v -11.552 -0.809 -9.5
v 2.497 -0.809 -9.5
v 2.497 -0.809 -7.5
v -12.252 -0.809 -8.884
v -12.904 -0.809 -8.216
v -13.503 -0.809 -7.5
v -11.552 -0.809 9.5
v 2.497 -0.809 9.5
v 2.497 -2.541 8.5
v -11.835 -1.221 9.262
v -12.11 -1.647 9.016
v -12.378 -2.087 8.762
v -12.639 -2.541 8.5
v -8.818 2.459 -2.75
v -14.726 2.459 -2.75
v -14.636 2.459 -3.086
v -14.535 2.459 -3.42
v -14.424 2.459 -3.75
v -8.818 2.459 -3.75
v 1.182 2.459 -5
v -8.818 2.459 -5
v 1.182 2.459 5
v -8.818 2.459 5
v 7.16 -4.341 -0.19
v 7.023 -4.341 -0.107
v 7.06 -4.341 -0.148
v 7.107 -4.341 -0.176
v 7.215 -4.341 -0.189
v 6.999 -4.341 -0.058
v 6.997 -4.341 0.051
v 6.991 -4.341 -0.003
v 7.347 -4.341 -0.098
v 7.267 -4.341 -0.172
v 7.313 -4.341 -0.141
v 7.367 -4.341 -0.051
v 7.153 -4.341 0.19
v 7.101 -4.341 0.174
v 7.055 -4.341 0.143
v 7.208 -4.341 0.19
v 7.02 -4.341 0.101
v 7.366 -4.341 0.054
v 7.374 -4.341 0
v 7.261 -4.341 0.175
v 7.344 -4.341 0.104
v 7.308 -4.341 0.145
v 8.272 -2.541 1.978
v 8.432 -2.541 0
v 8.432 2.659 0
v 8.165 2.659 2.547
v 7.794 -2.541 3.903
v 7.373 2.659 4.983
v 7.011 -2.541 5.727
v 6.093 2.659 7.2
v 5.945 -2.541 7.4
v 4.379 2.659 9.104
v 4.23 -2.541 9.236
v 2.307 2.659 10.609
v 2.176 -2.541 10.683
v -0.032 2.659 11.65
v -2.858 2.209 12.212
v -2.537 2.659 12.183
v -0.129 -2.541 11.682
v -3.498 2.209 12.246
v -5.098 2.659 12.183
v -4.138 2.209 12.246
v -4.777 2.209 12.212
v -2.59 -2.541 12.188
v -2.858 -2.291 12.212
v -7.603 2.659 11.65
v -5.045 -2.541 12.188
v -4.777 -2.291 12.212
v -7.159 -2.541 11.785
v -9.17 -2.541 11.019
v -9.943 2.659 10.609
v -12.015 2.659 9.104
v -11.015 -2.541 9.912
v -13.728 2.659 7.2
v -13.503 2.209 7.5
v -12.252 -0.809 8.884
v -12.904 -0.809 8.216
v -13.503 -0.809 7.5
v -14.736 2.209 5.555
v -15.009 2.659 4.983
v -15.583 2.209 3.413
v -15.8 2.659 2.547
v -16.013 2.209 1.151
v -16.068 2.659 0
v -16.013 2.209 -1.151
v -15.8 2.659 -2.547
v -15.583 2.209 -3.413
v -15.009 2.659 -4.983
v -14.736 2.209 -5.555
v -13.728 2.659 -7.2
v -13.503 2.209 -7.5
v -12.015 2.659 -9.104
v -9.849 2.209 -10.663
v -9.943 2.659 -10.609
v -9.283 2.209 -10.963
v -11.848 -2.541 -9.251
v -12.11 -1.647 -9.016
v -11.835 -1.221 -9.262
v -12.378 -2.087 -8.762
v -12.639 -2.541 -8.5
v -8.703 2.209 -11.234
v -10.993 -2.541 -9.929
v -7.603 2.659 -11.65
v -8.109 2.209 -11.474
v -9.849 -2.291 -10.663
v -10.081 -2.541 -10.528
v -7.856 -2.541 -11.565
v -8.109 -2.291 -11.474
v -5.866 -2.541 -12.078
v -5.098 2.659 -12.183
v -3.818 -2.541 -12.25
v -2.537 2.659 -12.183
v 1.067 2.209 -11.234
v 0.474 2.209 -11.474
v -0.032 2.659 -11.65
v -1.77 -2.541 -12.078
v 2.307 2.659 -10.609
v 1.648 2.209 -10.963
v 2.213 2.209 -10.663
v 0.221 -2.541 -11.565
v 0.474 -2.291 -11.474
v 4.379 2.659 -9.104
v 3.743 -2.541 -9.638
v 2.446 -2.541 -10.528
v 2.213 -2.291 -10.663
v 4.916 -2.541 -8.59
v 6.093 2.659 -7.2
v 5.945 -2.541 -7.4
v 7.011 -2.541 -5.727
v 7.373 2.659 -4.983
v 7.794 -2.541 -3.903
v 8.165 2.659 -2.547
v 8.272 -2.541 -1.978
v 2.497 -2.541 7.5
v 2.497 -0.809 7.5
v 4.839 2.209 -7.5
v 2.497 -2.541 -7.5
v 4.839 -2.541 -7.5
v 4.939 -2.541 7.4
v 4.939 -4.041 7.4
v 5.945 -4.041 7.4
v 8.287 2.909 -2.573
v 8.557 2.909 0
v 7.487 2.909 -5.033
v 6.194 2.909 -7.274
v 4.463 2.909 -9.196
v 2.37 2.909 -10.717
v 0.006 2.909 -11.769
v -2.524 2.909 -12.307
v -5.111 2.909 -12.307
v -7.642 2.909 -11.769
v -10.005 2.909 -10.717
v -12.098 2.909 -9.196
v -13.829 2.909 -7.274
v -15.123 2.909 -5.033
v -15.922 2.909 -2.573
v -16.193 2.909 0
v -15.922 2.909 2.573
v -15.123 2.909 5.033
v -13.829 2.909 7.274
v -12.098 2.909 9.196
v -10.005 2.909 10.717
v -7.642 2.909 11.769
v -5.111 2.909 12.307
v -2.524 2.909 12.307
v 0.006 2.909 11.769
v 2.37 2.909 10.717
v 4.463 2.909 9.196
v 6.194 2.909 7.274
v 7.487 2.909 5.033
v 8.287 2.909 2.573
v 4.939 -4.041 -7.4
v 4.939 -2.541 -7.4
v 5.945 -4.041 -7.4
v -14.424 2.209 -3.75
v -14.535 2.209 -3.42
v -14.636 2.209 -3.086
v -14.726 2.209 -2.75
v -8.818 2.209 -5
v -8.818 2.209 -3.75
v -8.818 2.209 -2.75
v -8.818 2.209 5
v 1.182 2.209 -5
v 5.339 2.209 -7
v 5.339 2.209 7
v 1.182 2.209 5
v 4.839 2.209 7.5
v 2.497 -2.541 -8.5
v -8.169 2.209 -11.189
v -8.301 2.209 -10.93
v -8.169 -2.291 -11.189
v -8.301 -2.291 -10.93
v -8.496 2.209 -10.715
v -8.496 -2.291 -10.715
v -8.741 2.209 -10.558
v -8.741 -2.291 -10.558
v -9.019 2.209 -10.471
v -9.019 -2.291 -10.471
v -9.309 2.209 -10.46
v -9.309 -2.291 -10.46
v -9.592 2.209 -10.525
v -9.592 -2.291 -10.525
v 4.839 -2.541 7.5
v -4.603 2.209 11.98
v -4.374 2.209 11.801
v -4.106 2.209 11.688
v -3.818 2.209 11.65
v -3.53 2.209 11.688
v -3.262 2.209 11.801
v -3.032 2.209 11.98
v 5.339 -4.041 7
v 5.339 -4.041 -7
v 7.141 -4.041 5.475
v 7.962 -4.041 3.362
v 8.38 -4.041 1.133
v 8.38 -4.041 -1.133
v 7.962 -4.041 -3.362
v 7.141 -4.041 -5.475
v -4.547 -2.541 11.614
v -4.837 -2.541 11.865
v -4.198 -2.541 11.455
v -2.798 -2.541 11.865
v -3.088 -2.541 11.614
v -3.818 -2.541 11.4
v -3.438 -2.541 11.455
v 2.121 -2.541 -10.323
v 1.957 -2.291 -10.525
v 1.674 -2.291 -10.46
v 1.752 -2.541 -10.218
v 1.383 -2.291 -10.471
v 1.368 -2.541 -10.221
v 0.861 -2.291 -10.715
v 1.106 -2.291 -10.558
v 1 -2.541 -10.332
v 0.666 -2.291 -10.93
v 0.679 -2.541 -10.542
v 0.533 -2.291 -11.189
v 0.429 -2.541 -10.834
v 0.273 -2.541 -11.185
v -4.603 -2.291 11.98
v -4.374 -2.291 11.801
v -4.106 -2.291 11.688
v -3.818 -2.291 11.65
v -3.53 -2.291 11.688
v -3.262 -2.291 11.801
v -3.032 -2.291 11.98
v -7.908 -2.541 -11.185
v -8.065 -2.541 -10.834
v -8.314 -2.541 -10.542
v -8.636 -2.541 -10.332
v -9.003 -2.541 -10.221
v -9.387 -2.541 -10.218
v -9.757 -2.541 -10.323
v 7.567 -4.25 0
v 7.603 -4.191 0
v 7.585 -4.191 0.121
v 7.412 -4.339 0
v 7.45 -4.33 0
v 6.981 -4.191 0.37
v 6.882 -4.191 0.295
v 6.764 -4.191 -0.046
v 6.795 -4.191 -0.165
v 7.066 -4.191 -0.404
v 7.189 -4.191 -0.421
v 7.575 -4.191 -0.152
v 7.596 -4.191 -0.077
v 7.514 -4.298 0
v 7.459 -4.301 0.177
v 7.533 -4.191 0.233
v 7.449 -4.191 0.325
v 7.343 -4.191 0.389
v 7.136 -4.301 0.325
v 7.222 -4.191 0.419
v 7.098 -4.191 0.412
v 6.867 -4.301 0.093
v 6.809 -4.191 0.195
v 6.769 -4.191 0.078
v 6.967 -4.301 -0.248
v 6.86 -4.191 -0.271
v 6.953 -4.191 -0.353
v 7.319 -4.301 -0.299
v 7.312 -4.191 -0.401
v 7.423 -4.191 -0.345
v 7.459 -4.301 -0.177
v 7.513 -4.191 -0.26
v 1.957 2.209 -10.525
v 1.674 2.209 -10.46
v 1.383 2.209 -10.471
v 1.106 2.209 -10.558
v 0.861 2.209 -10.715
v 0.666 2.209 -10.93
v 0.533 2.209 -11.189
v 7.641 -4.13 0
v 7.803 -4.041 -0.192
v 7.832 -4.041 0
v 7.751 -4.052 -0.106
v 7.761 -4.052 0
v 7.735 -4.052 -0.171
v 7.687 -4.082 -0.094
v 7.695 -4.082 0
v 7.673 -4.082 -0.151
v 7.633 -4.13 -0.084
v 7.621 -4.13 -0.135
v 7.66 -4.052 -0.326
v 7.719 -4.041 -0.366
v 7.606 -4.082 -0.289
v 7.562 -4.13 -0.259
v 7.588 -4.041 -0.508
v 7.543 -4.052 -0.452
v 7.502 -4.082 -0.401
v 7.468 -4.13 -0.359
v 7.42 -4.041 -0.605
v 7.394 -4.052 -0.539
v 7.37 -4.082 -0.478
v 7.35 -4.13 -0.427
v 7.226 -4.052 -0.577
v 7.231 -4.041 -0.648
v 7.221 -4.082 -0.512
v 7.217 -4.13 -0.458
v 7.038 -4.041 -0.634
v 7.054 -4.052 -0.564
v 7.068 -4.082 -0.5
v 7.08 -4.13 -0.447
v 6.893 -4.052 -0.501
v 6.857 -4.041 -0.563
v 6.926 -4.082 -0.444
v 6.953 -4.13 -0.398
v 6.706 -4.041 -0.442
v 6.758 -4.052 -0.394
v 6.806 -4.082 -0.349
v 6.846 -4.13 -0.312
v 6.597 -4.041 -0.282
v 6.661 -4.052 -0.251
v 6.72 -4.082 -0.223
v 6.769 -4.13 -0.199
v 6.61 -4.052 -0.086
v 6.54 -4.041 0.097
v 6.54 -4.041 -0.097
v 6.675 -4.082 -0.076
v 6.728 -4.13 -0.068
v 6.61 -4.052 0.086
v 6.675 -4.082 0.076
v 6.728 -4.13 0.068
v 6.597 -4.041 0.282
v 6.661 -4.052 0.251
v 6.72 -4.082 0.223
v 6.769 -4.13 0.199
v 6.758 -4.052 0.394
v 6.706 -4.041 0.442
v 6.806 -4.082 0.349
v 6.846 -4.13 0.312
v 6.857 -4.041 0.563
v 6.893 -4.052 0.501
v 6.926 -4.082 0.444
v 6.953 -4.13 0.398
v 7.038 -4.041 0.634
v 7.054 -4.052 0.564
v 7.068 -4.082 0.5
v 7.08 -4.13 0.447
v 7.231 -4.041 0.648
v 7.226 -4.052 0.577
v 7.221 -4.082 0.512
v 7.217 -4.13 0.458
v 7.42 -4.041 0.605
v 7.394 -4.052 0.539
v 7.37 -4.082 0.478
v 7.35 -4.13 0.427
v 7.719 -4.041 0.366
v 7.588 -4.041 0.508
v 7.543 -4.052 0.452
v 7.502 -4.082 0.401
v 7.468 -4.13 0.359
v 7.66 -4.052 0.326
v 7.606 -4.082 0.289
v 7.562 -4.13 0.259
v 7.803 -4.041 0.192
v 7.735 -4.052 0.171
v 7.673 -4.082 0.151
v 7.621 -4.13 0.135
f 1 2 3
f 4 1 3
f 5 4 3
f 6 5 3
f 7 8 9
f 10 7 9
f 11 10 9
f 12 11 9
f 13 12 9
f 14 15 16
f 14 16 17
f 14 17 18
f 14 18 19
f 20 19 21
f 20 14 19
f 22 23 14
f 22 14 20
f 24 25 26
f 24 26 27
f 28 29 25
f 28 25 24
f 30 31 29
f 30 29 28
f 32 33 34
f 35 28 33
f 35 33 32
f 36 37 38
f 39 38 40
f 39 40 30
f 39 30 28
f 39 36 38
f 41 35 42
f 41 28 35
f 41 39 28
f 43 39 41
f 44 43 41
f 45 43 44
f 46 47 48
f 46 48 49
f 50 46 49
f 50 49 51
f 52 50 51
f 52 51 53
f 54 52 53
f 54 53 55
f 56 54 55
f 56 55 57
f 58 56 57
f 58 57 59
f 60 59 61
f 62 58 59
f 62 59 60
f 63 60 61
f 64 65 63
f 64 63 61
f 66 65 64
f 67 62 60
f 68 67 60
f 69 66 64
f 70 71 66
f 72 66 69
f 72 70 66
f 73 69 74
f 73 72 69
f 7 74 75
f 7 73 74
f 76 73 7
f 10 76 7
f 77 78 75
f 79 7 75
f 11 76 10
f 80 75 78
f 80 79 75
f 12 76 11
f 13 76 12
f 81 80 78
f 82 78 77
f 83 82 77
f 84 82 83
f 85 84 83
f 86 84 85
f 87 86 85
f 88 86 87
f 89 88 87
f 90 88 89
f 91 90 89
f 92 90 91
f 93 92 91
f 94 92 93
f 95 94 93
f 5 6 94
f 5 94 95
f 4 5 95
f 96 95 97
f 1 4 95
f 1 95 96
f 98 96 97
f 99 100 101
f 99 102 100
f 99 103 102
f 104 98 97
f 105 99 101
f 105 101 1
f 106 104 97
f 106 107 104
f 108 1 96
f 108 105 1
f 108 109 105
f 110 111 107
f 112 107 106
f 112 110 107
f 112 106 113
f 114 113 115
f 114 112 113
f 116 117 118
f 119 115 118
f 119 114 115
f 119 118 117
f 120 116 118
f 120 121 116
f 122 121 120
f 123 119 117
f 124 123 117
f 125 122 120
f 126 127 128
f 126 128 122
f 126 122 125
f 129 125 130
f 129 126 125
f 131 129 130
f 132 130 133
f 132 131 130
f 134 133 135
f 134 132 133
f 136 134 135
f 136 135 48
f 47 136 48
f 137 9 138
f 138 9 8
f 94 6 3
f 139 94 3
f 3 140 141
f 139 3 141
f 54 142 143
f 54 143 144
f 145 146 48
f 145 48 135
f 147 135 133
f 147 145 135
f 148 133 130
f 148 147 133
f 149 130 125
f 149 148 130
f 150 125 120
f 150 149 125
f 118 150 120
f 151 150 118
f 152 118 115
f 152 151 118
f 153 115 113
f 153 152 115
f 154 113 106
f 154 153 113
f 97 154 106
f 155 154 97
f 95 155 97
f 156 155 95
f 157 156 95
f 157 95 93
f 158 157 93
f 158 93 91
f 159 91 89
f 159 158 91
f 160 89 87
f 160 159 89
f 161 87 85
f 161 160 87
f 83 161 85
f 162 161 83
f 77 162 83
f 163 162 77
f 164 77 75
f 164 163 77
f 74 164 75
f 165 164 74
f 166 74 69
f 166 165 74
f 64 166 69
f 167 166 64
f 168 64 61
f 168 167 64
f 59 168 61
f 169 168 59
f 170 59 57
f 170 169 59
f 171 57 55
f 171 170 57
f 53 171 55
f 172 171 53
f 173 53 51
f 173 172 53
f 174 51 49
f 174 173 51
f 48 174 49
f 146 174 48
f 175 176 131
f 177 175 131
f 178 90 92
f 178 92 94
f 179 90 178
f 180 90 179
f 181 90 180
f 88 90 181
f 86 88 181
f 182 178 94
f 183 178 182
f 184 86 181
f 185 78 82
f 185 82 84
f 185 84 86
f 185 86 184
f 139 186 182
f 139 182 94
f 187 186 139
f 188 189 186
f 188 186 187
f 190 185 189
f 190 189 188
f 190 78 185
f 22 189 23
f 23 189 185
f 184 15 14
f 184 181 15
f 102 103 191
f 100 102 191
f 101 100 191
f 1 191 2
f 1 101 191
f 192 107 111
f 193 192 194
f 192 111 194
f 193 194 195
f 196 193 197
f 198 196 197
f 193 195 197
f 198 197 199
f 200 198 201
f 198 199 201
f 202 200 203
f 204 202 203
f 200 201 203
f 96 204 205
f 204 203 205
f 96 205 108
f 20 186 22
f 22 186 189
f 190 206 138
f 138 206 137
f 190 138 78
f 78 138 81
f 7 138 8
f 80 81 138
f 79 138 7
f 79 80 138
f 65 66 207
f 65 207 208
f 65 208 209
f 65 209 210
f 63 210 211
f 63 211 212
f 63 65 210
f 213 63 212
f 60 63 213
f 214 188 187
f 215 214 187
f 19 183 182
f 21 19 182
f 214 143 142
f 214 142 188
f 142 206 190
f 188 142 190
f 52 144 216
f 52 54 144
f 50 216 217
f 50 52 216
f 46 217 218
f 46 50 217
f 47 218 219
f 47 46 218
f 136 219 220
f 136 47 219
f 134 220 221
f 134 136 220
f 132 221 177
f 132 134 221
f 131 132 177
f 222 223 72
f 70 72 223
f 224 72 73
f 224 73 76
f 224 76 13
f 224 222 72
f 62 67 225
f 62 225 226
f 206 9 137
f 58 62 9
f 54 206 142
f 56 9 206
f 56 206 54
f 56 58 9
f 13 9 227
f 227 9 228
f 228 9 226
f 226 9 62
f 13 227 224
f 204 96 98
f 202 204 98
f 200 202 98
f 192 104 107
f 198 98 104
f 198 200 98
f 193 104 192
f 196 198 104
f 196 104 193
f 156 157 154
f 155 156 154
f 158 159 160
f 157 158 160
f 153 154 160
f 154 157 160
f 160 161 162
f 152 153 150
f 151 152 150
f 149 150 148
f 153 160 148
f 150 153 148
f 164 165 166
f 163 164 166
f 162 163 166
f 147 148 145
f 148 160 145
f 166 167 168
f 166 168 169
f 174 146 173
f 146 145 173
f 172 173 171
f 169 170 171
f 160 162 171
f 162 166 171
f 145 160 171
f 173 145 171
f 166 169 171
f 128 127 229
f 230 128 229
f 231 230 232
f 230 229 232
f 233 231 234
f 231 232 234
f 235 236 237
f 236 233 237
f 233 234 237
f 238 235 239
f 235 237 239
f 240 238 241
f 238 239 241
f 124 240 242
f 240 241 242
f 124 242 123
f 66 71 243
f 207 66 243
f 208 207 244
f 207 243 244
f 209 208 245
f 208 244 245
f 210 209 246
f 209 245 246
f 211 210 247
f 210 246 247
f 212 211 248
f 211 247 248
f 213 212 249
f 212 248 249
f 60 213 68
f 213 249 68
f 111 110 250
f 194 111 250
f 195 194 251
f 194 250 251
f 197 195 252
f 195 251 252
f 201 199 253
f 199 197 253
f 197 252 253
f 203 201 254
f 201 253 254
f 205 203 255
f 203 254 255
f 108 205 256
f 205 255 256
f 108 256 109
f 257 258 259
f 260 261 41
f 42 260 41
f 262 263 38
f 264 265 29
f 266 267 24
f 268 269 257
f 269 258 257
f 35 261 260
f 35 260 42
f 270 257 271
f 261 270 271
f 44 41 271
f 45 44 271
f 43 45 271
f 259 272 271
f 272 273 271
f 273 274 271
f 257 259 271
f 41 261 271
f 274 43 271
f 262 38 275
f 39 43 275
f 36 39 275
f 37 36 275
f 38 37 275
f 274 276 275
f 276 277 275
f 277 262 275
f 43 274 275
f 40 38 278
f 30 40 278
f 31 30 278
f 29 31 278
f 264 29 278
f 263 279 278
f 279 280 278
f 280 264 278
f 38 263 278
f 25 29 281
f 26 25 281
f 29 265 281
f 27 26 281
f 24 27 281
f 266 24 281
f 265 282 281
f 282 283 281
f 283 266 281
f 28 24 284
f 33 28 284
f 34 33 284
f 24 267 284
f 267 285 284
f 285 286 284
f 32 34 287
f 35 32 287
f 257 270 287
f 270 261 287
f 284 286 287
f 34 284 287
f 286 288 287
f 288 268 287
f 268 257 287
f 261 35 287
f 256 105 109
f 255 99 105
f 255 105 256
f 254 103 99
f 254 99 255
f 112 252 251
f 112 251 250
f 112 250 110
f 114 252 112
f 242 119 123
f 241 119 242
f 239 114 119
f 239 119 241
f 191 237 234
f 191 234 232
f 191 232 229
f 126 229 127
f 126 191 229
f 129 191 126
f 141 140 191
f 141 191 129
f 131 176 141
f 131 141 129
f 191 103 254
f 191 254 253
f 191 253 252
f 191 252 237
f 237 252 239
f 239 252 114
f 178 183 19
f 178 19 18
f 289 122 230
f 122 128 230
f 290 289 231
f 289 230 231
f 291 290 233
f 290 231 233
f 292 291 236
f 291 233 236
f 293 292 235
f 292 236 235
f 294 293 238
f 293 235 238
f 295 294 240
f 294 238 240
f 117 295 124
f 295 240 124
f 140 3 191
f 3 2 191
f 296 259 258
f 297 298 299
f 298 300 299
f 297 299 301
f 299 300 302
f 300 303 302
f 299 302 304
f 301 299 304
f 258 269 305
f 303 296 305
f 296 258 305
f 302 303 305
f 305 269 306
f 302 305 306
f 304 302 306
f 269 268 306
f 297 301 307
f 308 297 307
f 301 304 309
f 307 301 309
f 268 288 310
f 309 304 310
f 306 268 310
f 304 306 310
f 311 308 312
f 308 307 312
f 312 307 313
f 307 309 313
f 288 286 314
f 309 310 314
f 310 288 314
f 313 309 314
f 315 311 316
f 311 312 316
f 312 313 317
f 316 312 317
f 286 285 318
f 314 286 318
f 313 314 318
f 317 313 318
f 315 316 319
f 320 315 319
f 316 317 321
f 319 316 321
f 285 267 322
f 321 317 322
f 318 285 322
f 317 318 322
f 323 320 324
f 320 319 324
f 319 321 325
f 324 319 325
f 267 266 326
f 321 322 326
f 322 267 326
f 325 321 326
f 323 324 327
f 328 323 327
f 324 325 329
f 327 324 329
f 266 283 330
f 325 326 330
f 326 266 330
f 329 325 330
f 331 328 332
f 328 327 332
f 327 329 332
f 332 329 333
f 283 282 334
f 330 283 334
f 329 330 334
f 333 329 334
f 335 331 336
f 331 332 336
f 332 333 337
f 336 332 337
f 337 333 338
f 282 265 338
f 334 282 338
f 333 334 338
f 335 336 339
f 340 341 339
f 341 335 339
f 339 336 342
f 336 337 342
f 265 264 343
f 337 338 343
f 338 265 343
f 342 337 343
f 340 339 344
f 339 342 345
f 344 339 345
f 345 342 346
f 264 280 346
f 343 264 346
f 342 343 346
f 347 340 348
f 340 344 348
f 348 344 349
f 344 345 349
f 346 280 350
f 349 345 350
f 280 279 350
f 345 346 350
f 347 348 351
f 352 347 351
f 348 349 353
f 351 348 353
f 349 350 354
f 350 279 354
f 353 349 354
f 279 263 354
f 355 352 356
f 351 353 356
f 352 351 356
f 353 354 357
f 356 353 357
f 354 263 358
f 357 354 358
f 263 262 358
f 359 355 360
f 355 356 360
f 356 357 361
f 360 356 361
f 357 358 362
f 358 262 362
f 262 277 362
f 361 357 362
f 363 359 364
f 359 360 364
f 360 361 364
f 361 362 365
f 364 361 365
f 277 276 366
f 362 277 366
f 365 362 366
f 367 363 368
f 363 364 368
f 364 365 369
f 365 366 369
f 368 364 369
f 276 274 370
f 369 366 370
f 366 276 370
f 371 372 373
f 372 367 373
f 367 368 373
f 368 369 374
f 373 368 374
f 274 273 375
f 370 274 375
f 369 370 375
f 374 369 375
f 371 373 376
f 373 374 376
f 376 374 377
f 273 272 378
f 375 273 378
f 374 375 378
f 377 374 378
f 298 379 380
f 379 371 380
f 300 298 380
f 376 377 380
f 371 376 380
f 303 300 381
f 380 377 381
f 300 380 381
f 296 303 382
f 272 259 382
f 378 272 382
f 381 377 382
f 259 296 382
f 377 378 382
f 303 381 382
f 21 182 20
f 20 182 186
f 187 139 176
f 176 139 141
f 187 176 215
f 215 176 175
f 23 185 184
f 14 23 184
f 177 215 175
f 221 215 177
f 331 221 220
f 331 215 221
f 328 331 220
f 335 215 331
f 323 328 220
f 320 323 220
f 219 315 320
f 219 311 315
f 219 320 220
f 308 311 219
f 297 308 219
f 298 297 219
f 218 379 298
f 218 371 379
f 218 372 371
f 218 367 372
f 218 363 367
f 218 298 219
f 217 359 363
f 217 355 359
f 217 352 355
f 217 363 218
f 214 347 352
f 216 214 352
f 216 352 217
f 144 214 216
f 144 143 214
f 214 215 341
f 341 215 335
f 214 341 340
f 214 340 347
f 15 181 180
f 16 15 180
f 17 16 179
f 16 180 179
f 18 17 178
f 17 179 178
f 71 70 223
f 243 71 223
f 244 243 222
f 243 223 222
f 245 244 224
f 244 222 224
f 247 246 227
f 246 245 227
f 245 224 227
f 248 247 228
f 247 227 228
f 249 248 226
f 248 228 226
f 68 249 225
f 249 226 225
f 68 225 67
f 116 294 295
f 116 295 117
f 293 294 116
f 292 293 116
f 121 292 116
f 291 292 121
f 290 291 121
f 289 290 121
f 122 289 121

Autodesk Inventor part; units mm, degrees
ref_plane "YZ Plane" through (0, 0, 0) normal (1, 0, 0) x (0, 1, 0)
ref_plane "XZ Plane" through (0, 0, 0) normal (0, 1, 0) x (-1, 0, 0)
ref_plane "XY Plane" through (0, 0, 0) normal (0, 0, 1) x (1, 0, 0)
sketch "Sketch1" plane through (0, 0, 0) normal (0, 0, 1) x (1, 0, 0)
  line L0 (-3.8177, -2.5414) -> (-3.8177, 2.9086)
  line L1 (-3.8177, 2.9086) -> (8.4464, 2.9086)
  line L2 (8.4323, 2.6586) -> (8.4323, -2.5414)
  line L3 (8.4323, -2.5414) -> (-3.8177, -2.5414)
  line L4 (-3.8177, 8.4062) -> (-3.8177, -10.1402)
  line L5 (8.4323, 2.6586) -> (8.5573, 2.9086)
  line L6 (8.5573, 2.9086) -> (8.4464, 2.9086)
  point P0 (0, 0)
  dimension "d1" = 24.5
  dimension "d2" = 5.45
  dimension "d29" = 0.25
  dimension "d30" = 24.75
revolve "Revolution1" add sketch "Sketch1" angle 360 about axis through (-3.8177, 8.4062, 0) along (0, -1, 0)
sketch "Sketch2" plane through (-3.8177, -2.5414, 0) normal (0, -1, 0) x (1, 0, 0)
  circle A0 centre (0, 0) radius 12.75 construction
  circle A1 centre (0, 0) radius 12.25 projected
  line L0 (0, 12.75) -> (0, -12.75) construction
  line L1 (-5.3884, -11.5554) -> (5.3884, 11.5554) construction
  line L2 (-5.3884, 11.5554) -> (5.3884, -11.5554) construction
  circle A2 centre (-5.3884, -11.5554) radius 1.1
  circle A3 centre (5.3884, -11.5554) radius 1.1
  circle A4 centre (0, 12.75) radius 1.1
  point P0 (3.8177, 0)
  dimension "d4" = 25.5
  dimension "d5" = 25
  dimension "d6" = 25
  dimension "d7" = 2.2
extrude "Extrusion1" cut sketch "Sketch2" against normal blind 4.75 contours A4 A1 | A1 A4 | A3 A1 | A1 A3 | A2 A1 | A1 A2
sketch "Sketch3" plane through (-3.8177, -2.5414, 0) normal (0, -1, 0) x (1, 0, 0)
  line L0 (-12.375, -7.5) -> (9.1567, -7.5)
  line L1 (9.1567, 7.5) -> (-12.375, 7.5)
  circle A0 centre (0, 0) radius 9.9629 construction
  line L2 (-12.375, 7.5) -> (-12.375, -7.5)
  line L3 (9.1567, -7.5) -> (9.1567, 7.5)
  circle A1 centre (0, 0) radius 12.375 projected
  point P0 (-9.8433, -7.5)
  dimension "d11" = 15
  dimension "d92" = 7.5
  dimension "d94" = 19
extrude "Extrusion2" cut sketch "Sketch3" against normal up to surface (4.75 mm away) contours L2 A1 L0 | A1 L1 L3 L0 | L2 L1 A1 picked at (1.9795, 0)
sketch "Sketch5" plane through (-13.5034, 2.2086, 7.5) normal (0, -1, 0) x (1, 0, 0)
  line L0 (14.6857, -2.5) -> (4.6857, -2.5)
  line L1 (4.6857, -2.5) -> (4.6857, -12.5)
  line L2 (4.6857, -12.5) -> (14.6857, -12.5)
  line L3 (14.6857, -12.5) -> (14.6857, -2.5)
  line L4 (14.6857, -2.5) -> (4.6857, -12.5) construction
  line L5 (4.6857, -2.5) -> (14.6857, -12.5) construction
  line L6 (-1.8929, -11.5) -> (-2.0018, -11.5)
  arc A0 (0, 0) -> (0, -15) centre (9.6857, -7.5) ccw projected
  arc A1 (0.7907, -0.6122) -> (0.7907, -14.3878) centre (9.6857, -7.5) ccw
  line L7 (4.6857, -11.25) -> (-0.9209, -11.25)
  line L8 (-1.223, -10.25) -> (4.6857, -10.25)
  point P0 (4.6857, -11.5)
  dimension "d95" = 10
  dimension "d99" = 1
  dimension "d100" = 1
  dimension "d101" = 1.25
extrude "Extrusion3" cut sketch "Sketch5" against normal blind 0.25
sketch "Sketch7" plane through (-3.8177, 2.9086, 0) normal (0, 1, 0) x (1, 0, 0)
  arc A0 (12.3346, 0.9992) -> (12.3346, -0.9992) centre (12.375, 0) ccw
  circle A1 centre (0, 0) radius 12.375 projected
  arc A2 (-12.3346, -0.9992) -> (-12.3346, 0.9992) centre (-12.375, 0) ccw
  line L0 (-12.375, 0) -> (12.375, 0) construction
  dimension "d34" = 2
extrude "Extrusion5" [suppressed]
ref_plane "Work Plane1" through (-13.5034, 0.0586, -7.5) normal (1, 0, 0) x (0, 1, 0)
ref_plane "Work Plane3" through (-16.0677, 0.0586, 0) normal (-1, 0, 0) x (0, -1, 0)
ref_plane "Work Plane2" through (5.339, -2.5414, 0) normal (0, 0, -1) x (-1, 0, 0)
sketch "Sketch10" plane through (-13.5034, 0.0586, -7.5) normal (1, 0, 0) x (0, 1, 0)
  line L0 (-0.8679, 15) -> (-0.8679, 17)
  line L1 (-0.8679, 17) -> (-2.6, 16)
  line L2 (2.15, 15) -> (-2.6, 15) projected
  line L3 (-2.6, 19.7124) -> (-2.6, 15) projected
  line L4 (-2.6, 0) -> (2.15, 0) projected
  line L5 (-2.6, 0) -> (-2.6, -3.1626) projected
  point P0 (-0.0586, 7.5)
  dimension "d69" = 60
  dimension "d70" = 1
  dimension "d71" = 2
extrude "Extrusion8" cut sketch "Sketch10" along normal blind 16
mirror "Mirror1" about plane through (5.339, -2.5414, 0) normal (0, 0, -1) of "Extrusion8"
chamfer "Chamfer2" distance 0.25 angle 45 3 edges at (-8.7412, -2.5414, -10.5585) (1.1058, -2.5414, -10.5585) (-3.8177, -2.5414, 11.65)
sketch "Sketch11" plane through (5.339, -2.5414, -7.5) normal (0, -1, 0) x (1, 0, 0)
  arc A0 (-10.3843, 19.6883) -> (-7.9291, 19.6883) centre (-9.1567, 20.25) ccw projected
  arc A1 (-10.3843, 19.6883) -> (-17.9778, 16) centre (-9.1567, 7.5) ccw projected
  line L0 (-17.9778, 16) -> (-2.8424, 16) projected
  line L1 (-2.8424, 16) -> (-2.8424, 15) projected
  line L2 (-2.8424, 15) -> (0, 15) projected
  line L3 (0, 15) -> (0, 0) projected
  line L4 (0, 0) -> (-2.8424, 0) projected
  line L5 (-2.8424, 0) -> (-2.8424, -1) projected
  line L6 (-2.8424, -1) -> (-17.9778, -1) projected
  arc A2 (-17.9778, -1) -> (-15.4203, -3.0276) centre (-9.1567, 7.5) ccw projected
  arc A3 (-13.1951, -4.0652) -> (-15.4203, -3.0276) centre (-14.5451, -4.0554) ccw projected
  arc A4 (-13.1951, -4.0652) -> (-5.1183, -4.0652) centre (-9.1567, 7.5) ccw projected
  arc A5 (-2.8931, -3.0276) -> (-5.1183, -4.0652) centre (-3.7683, -4.0554) ccw projected
  arc A6 (-2.8931, -3.0276) -> (-7.9291, 19.6883) centre (-9.1567, 7.5) ccw projected
  line L7 (0, 0.1) -> (0.6056, 0.1)
  line L8 (0, 14.9) -> (0.6056, 14.9)
  line L9 (-18.8424, 0) -> (-2.8424, 0) projected
  dimension "d82" = 0.1
  dimension "d83" = 0.1
extrude "Extrusion9" add sketch "Sketch11" along normal blind 1.5 contours A6 L7 L3 L8
chamfer "Chamfer3" distance 0.5 angle 45 2 edges at (5.339, -0.1664, 7.5) (5.339, -0.1664, -7.5)
sketch "Sketch12" plane through (5.339, -4.0414, -7.5) normal (0, -1, 0) x (1, 0, 0)
  circle A0 centre (1.8433, 7.5) radius 0.4
  circle A1 centre (-9.1567, 7.5) radius 12.25 construction
  arc A2 (-13.1951, -4.0652) -> (-5.1183, -4.0652) centre (-9.1567, 7.5) ccw projected
  dimension "d87" = 11
  dimension "d88" = 0.8
extrude "Extrusion10" add sketch "Sketch12" along normal blind 0.3
fillet "Fillet1" radius 0.25 2 edges at (6.7823, -4.0414, 0) (6.7823, -4.3414, 0)
equation "\"d92\" = 0.5 * d11"
properties part number "bottom1_2_bigtouch" material "Acrylic"
